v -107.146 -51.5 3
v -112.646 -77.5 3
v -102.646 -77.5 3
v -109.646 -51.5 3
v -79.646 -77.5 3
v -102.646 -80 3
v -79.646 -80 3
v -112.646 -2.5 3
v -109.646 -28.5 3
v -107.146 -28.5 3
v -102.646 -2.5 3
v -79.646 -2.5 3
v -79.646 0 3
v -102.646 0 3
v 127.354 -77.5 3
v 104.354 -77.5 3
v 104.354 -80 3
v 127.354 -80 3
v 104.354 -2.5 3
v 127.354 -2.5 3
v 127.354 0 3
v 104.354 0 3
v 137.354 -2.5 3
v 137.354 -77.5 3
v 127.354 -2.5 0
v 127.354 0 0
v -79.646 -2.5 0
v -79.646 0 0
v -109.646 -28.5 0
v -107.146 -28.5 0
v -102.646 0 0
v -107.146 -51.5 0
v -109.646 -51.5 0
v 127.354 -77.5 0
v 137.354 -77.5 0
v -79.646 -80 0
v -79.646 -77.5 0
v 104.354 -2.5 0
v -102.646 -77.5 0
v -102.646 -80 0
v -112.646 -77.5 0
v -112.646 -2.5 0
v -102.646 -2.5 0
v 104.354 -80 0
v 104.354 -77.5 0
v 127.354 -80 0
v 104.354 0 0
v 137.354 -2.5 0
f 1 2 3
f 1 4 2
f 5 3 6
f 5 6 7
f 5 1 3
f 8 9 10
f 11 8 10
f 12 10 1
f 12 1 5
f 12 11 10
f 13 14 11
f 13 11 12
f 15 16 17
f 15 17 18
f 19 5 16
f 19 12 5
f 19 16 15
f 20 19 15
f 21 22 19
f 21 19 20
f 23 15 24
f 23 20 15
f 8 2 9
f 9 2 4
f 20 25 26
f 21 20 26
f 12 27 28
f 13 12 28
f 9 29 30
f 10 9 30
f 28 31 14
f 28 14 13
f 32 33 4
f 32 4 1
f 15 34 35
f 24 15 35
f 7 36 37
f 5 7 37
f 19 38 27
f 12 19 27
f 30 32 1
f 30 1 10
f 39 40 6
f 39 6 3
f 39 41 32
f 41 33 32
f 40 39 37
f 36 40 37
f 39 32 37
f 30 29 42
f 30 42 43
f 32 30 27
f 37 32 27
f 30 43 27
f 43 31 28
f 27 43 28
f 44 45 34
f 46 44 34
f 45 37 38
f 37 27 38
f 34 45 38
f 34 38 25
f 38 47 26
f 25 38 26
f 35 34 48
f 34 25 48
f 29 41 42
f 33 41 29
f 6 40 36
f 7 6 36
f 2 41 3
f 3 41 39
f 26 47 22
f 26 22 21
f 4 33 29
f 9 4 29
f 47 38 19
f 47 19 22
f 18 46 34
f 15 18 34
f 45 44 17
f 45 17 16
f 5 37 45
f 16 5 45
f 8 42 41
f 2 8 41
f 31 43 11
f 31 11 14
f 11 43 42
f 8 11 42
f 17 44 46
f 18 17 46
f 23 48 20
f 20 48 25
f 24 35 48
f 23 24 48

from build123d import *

# Parameters (mm, degrees)
F0_W     = 2.5
F0_H     = 23
F0_W_2   = 23
F0_H_2   = 2.5
F1_DEPTH = 3


with BuildPart() as f1:
    # F0 (on Top) → F1 (new body)
    with BuildSketch(Plane.XY):
        Polygon((-112.64636, -2.5), (-112.64636, -77.5), (-102.64636, -77.5), (-79.64636, -77.5), (104.35364, -77.5), (127.35364, -77.5), (137.35364, -77.5), (137.35364, -2.5), (127.35364, -2.5), (104.35364, -2.5), (-79.64636, -2.5), (-102.64636, -2.5), align=None)
        with Locations((-108.39636, -40)):
            Rectangle(F0_W, F0_H, mode=Mode.SUBTRACT)
        with Locations((-91.14636, -78.75)):
            Rectangle(F0_W_2, F0_H_2)
        with Locations((-91.14636, -1.25)):
            Rectangle(F0_W_2, F0_H_2)
        with Locations((115.85364, -78.75)):
            Rectangle(F0_W_2, F0_H_2)
        with Locations((115.85364, -1.25)):
            Rectangle(F0_W_2, F0_H_2)
    extrude(amount=F1_DEPTH)


solid = f1.part
